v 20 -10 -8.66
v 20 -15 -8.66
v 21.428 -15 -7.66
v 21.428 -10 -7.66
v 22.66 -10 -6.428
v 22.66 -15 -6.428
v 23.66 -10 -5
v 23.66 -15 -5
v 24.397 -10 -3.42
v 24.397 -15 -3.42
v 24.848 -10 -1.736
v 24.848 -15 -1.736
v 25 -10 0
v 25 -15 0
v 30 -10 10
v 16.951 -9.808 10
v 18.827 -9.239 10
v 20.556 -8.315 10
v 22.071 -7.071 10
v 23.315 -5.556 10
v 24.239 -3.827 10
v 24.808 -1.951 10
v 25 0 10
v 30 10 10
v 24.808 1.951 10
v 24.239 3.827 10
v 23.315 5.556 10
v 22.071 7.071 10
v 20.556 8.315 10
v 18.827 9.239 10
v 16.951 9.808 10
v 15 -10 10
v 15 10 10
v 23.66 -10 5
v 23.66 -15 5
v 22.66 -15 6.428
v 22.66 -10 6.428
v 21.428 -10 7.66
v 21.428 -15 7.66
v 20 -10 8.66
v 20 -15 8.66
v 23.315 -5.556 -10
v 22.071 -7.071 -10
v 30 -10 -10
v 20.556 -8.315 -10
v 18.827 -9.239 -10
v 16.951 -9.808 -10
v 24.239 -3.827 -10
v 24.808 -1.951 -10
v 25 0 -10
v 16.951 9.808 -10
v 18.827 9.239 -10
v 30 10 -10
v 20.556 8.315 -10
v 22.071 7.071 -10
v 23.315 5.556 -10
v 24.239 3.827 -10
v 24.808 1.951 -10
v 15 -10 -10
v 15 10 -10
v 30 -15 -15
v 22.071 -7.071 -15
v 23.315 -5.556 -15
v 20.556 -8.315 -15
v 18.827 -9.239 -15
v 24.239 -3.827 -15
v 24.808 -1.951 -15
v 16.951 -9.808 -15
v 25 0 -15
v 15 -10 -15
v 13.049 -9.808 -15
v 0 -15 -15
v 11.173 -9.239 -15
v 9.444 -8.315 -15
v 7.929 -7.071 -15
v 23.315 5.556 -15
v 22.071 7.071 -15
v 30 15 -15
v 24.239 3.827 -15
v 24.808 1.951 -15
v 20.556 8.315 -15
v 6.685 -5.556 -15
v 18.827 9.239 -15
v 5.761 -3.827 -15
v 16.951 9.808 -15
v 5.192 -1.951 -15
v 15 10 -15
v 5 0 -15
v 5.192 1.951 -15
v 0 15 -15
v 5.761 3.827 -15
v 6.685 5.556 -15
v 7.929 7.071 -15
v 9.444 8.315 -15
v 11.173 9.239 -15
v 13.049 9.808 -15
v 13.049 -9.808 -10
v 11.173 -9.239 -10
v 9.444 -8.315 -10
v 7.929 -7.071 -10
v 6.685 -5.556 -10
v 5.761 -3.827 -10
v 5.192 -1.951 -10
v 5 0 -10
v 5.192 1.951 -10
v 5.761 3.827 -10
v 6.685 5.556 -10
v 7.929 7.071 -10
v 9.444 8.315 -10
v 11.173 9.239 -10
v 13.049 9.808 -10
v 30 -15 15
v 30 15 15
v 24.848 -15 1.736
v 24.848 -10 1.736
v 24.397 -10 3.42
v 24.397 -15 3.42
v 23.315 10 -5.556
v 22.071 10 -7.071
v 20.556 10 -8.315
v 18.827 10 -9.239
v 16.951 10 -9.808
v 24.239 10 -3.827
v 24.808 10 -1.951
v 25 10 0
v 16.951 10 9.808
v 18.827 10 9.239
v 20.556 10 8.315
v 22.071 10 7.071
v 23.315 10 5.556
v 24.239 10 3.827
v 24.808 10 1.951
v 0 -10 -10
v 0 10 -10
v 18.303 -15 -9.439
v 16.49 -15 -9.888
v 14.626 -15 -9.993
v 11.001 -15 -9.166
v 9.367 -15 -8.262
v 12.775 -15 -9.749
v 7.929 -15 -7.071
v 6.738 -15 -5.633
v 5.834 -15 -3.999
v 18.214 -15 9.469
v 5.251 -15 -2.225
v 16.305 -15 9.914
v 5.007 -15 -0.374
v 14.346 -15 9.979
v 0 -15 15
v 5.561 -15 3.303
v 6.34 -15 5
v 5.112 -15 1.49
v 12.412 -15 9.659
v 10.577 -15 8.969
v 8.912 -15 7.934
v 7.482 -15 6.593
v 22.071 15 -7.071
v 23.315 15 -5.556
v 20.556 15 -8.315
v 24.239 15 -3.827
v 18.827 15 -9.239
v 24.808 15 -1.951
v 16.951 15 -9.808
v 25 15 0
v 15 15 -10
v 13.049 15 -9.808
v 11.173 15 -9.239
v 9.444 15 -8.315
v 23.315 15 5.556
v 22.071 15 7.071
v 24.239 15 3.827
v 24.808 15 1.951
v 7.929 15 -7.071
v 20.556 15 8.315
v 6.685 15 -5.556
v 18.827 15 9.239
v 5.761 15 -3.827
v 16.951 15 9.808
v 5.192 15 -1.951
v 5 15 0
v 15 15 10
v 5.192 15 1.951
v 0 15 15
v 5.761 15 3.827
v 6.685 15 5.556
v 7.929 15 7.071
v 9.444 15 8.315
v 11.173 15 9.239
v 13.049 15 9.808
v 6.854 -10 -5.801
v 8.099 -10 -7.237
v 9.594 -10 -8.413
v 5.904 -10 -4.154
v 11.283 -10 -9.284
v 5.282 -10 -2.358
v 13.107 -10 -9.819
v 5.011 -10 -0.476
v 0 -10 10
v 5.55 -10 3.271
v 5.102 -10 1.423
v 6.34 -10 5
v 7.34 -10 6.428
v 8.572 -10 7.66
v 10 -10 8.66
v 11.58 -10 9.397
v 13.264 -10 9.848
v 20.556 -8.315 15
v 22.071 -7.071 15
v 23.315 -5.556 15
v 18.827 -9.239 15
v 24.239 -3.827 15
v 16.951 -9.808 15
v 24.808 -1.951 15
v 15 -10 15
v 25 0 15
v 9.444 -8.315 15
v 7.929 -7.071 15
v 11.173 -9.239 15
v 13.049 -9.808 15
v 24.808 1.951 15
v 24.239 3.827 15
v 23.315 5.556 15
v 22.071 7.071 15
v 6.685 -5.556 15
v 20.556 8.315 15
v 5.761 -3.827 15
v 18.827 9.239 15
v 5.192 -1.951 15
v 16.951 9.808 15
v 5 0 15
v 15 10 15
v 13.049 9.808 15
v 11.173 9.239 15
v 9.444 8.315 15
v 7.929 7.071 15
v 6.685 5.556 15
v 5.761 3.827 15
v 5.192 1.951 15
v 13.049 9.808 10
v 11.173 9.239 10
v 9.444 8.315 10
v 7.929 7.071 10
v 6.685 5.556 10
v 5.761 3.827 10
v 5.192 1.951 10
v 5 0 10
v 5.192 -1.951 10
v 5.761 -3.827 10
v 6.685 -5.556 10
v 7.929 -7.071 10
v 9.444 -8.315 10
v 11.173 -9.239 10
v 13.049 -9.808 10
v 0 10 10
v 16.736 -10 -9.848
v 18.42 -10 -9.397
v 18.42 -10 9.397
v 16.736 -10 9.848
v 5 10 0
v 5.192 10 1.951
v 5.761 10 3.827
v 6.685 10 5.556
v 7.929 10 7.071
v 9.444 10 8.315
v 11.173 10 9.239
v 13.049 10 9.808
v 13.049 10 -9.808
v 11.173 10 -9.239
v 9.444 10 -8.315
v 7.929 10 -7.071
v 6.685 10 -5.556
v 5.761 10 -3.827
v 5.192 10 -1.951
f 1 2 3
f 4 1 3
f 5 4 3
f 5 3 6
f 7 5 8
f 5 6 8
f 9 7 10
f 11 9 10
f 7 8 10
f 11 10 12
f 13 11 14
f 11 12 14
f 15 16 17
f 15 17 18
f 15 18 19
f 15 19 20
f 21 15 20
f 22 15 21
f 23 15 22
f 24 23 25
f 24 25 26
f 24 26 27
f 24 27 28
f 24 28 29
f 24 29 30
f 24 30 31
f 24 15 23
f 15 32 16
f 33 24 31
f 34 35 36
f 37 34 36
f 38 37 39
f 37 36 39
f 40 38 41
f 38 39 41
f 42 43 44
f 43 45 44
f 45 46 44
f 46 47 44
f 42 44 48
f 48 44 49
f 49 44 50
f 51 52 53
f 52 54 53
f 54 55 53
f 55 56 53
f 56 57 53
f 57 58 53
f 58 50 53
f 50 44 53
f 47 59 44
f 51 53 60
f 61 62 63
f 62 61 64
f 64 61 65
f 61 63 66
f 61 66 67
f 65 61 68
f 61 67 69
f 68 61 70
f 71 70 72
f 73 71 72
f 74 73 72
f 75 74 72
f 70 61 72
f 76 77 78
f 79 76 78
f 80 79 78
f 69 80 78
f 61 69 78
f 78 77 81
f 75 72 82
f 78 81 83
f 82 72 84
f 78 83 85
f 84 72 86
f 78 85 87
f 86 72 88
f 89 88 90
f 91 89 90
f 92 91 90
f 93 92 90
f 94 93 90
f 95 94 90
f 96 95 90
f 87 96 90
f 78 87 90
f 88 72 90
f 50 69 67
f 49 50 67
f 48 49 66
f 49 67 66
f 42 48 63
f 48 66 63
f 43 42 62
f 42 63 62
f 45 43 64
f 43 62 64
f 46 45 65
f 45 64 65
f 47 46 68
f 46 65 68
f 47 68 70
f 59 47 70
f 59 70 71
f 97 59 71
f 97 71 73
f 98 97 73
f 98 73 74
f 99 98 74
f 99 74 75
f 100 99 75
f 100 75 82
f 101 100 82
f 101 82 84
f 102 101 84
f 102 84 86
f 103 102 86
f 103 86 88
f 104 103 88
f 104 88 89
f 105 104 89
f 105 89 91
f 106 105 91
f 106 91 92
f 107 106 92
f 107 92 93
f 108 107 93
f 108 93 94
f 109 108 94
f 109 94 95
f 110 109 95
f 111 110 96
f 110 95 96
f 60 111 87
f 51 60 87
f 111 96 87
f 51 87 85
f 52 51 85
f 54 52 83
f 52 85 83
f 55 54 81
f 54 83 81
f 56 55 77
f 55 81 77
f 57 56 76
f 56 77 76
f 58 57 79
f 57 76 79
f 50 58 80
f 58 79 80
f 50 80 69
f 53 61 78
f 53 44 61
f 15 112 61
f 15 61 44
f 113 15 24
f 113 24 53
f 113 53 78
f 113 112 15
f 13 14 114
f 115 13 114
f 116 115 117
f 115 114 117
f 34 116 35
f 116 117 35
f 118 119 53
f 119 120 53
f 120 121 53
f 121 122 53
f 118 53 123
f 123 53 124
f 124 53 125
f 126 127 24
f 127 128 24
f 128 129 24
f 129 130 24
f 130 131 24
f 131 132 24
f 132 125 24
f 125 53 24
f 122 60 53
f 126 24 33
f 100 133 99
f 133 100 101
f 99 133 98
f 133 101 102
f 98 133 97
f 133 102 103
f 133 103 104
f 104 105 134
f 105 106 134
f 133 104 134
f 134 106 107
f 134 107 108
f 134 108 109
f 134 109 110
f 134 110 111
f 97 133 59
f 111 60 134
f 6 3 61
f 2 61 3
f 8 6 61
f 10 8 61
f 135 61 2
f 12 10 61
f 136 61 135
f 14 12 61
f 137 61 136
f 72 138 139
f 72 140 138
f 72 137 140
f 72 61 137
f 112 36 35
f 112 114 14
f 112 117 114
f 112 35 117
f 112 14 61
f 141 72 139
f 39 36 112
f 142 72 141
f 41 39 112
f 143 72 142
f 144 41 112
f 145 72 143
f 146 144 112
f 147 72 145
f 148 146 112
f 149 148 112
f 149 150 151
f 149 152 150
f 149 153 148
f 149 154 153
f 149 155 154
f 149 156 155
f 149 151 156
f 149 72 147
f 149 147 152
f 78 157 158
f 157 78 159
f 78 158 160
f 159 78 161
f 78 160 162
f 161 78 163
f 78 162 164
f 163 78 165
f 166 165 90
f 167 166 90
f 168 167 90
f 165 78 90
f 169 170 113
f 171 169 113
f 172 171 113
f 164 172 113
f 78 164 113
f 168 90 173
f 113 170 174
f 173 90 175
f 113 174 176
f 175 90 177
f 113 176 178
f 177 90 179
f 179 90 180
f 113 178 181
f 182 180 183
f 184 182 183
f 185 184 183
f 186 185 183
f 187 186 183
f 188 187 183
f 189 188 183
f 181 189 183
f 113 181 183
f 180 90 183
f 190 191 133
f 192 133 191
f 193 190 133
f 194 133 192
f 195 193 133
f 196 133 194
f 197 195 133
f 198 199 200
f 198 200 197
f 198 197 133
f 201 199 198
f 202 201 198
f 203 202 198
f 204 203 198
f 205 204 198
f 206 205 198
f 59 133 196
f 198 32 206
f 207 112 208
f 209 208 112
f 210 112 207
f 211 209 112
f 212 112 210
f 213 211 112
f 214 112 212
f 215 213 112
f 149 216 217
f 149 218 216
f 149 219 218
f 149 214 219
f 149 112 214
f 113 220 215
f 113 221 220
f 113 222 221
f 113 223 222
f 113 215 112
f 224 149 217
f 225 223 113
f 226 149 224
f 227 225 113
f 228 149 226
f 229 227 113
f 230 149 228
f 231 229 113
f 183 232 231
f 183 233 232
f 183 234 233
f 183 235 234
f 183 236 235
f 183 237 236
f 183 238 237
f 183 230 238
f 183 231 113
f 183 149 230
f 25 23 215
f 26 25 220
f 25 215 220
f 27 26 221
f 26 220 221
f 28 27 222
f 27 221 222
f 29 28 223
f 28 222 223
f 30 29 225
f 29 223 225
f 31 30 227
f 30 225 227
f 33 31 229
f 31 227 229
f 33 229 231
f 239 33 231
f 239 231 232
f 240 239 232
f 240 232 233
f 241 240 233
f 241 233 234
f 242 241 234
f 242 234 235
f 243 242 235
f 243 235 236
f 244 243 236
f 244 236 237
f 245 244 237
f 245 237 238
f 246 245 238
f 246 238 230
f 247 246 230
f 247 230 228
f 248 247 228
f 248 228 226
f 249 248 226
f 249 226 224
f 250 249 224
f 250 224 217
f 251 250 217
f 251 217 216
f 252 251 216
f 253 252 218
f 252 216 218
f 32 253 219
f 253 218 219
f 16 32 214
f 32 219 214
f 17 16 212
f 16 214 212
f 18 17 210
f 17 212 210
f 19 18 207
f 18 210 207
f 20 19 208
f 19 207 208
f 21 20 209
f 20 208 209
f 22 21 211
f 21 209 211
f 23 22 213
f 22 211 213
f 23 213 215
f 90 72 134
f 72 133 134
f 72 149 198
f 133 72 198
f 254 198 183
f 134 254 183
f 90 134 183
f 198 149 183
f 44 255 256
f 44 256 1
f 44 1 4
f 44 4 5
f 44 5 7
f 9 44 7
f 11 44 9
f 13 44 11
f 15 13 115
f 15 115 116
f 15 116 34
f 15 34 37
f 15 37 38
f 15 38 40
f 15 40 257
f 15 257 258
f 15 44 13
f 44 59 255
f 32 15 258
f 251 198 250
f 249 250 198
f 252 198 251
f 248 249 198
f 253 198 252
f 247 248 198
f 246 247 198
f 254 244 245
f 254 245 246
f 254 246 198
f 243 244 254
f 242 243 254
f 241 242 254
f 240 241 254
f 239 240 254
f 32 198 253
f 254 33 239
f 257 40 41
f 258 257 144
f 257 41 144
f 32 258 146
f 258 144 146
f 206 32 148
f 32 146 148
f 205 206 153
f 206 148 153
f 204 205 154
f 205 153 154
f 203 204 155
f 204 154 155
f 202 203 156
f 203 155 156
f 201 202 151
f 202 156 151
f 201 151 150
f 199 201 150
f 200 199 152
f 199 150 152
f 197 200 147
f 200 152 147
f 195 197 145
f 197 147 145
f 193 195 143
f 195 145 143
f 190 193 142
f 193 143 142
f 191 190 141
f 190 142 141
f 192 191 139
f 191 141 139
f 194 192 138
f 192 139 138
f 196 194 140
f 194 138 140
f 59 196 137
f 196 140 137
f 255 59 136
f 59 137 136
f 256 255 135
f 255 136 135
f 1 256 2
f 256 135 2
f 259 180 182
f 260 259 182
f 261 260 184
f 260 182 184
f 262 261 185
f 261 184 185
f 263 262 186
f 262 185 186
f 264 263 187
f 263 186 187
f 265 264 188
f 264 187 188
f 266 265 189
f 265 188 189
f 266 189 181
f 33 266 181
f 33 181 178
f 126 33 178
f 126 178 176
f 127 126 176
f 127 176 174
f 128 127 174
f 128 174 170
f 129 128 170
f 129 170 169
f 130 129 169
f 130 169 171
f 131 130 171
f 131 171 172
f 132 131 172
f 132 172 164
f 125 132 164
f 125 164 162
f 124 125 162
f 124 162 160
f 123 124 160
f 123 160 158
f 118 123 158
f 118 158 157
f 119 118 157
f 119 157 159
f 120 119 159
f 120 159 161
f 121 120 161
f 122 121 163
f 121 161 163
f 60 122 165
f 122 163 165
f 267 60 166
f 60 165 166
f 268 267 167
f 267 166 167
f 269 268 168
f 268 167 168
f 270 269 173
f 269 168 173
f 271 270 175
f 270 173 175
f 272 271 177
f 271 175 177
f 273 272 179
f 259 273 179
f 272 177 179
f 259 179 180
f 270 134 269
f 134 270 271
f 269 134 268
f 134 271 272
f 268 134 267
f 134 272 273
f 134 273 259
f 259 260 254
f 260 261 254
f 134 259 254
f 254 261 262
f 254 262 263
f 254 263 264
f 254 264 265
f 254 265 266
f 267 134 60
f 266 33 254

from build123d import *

# Parameters (mm, degrees)
F0_W      = 30
F0_H      = 30
F1_DEPTH  = 30
F2_W      = 20
F2_H      = 20
F3_DEPTH  = 30.001
F5_DEPTH  = 5
F6_R      = 10
F7_DEPTH  = 5
F8_R      = 10
F9_DEPTH  = 5
F10_R     = 10
F11_DEPTH = 5


with BuildPart() as f1:
    # F0 (on Right) → F1 (new body)
    with BuildSketch(Plane.YZ):
        Rectangle(F0_W, F0_H)
    extrude(amount=F1_DEPTH)

    # F2 (on face) → F3 (cut, through all)
    with BuildSketch(Plane.YZ.offset(30)):
        Rectangle(F2_W, F2_H)
    extrude(amount=-F3_DEPTH, mode=Mode.SUBTRACT)

    # F4 (on face) → F5 (cut, through all)
    with BuildSketch(Plane.XZ.offset(15)):
        with BuildLine():
            Line((20, 5), (23.6602540378, 5))
            ThreePointArc((23.6602540378, 5), (22.0710678119, 7.0710678119), (20, 8.6602540378))
            Line((20, 8.6602540378), (20, 5))
        make_face()
        with BuildLine():
            Line((20, 5), (20, 8.6602540378))
            ThreePointArc((20, 8.6602540378), (12.411809549, 9.6592582629), (6.3397459622, 5))
            Line((6.3397459622, 5), (20, 5))
        make_face()
        with BuildLine():
            ThreePointArc((6.3397459622, 5), (7.9289321881, -7.0710678119), (20, -8.6602540378))
            Line((20, -8.6602540378), (20, 5))
            Line((20, 5), (6.3397459622, 5))
        make_face()
        with BuildLine():
            ThreePointArc((20, -8.6602540378), (23.6602540378, -5), (25, 0))
            ThreePointArc((25, 0), (24.6592582629, 2.588190451), (23.6602540378, 5))
            Line((23.6602540378, 5), (20, 5))
            Line((20, 5), (20, -8.6602540378))
        make_face()
    extrude(amount=-F5_DEPTH, mode=Mode.SUBTRACT)

    # F6 (on face) → F7 (cut, through all)
    with BuildSketch(Plane.XY.offset(15)):
        with Locations((15, 0)):
            Circle(F6_R)
    extrude(amount=-F7_DEPTH, mode=Mode.SUBTRACT)

    # F8 (on face) → F9 (cut, through all)
    with BuildSketch(Plane(origin=(0, 15, 0), x_dir=(-1, 0, 0), z_dir=(0, 1, 0))):
        with Locations((-15, 0)):
            Circle(F8_R)
    extrude(amount=-F9_DEPTH, mode=Mode.SUBTRACT)

    # F10 (on face) → F11 (cut, through all)
    with BuildSketch(Plane(origin=(0, 0, -15), x_dir=(1, 0, 0), z_dir=(0, 0, -1))):
        with Locations((15, 0)):
            Circle(F10_R)
    extrude(amount=-F11_DEPTH, mode=Mode.SUBTRACT)


solid = f1.part
